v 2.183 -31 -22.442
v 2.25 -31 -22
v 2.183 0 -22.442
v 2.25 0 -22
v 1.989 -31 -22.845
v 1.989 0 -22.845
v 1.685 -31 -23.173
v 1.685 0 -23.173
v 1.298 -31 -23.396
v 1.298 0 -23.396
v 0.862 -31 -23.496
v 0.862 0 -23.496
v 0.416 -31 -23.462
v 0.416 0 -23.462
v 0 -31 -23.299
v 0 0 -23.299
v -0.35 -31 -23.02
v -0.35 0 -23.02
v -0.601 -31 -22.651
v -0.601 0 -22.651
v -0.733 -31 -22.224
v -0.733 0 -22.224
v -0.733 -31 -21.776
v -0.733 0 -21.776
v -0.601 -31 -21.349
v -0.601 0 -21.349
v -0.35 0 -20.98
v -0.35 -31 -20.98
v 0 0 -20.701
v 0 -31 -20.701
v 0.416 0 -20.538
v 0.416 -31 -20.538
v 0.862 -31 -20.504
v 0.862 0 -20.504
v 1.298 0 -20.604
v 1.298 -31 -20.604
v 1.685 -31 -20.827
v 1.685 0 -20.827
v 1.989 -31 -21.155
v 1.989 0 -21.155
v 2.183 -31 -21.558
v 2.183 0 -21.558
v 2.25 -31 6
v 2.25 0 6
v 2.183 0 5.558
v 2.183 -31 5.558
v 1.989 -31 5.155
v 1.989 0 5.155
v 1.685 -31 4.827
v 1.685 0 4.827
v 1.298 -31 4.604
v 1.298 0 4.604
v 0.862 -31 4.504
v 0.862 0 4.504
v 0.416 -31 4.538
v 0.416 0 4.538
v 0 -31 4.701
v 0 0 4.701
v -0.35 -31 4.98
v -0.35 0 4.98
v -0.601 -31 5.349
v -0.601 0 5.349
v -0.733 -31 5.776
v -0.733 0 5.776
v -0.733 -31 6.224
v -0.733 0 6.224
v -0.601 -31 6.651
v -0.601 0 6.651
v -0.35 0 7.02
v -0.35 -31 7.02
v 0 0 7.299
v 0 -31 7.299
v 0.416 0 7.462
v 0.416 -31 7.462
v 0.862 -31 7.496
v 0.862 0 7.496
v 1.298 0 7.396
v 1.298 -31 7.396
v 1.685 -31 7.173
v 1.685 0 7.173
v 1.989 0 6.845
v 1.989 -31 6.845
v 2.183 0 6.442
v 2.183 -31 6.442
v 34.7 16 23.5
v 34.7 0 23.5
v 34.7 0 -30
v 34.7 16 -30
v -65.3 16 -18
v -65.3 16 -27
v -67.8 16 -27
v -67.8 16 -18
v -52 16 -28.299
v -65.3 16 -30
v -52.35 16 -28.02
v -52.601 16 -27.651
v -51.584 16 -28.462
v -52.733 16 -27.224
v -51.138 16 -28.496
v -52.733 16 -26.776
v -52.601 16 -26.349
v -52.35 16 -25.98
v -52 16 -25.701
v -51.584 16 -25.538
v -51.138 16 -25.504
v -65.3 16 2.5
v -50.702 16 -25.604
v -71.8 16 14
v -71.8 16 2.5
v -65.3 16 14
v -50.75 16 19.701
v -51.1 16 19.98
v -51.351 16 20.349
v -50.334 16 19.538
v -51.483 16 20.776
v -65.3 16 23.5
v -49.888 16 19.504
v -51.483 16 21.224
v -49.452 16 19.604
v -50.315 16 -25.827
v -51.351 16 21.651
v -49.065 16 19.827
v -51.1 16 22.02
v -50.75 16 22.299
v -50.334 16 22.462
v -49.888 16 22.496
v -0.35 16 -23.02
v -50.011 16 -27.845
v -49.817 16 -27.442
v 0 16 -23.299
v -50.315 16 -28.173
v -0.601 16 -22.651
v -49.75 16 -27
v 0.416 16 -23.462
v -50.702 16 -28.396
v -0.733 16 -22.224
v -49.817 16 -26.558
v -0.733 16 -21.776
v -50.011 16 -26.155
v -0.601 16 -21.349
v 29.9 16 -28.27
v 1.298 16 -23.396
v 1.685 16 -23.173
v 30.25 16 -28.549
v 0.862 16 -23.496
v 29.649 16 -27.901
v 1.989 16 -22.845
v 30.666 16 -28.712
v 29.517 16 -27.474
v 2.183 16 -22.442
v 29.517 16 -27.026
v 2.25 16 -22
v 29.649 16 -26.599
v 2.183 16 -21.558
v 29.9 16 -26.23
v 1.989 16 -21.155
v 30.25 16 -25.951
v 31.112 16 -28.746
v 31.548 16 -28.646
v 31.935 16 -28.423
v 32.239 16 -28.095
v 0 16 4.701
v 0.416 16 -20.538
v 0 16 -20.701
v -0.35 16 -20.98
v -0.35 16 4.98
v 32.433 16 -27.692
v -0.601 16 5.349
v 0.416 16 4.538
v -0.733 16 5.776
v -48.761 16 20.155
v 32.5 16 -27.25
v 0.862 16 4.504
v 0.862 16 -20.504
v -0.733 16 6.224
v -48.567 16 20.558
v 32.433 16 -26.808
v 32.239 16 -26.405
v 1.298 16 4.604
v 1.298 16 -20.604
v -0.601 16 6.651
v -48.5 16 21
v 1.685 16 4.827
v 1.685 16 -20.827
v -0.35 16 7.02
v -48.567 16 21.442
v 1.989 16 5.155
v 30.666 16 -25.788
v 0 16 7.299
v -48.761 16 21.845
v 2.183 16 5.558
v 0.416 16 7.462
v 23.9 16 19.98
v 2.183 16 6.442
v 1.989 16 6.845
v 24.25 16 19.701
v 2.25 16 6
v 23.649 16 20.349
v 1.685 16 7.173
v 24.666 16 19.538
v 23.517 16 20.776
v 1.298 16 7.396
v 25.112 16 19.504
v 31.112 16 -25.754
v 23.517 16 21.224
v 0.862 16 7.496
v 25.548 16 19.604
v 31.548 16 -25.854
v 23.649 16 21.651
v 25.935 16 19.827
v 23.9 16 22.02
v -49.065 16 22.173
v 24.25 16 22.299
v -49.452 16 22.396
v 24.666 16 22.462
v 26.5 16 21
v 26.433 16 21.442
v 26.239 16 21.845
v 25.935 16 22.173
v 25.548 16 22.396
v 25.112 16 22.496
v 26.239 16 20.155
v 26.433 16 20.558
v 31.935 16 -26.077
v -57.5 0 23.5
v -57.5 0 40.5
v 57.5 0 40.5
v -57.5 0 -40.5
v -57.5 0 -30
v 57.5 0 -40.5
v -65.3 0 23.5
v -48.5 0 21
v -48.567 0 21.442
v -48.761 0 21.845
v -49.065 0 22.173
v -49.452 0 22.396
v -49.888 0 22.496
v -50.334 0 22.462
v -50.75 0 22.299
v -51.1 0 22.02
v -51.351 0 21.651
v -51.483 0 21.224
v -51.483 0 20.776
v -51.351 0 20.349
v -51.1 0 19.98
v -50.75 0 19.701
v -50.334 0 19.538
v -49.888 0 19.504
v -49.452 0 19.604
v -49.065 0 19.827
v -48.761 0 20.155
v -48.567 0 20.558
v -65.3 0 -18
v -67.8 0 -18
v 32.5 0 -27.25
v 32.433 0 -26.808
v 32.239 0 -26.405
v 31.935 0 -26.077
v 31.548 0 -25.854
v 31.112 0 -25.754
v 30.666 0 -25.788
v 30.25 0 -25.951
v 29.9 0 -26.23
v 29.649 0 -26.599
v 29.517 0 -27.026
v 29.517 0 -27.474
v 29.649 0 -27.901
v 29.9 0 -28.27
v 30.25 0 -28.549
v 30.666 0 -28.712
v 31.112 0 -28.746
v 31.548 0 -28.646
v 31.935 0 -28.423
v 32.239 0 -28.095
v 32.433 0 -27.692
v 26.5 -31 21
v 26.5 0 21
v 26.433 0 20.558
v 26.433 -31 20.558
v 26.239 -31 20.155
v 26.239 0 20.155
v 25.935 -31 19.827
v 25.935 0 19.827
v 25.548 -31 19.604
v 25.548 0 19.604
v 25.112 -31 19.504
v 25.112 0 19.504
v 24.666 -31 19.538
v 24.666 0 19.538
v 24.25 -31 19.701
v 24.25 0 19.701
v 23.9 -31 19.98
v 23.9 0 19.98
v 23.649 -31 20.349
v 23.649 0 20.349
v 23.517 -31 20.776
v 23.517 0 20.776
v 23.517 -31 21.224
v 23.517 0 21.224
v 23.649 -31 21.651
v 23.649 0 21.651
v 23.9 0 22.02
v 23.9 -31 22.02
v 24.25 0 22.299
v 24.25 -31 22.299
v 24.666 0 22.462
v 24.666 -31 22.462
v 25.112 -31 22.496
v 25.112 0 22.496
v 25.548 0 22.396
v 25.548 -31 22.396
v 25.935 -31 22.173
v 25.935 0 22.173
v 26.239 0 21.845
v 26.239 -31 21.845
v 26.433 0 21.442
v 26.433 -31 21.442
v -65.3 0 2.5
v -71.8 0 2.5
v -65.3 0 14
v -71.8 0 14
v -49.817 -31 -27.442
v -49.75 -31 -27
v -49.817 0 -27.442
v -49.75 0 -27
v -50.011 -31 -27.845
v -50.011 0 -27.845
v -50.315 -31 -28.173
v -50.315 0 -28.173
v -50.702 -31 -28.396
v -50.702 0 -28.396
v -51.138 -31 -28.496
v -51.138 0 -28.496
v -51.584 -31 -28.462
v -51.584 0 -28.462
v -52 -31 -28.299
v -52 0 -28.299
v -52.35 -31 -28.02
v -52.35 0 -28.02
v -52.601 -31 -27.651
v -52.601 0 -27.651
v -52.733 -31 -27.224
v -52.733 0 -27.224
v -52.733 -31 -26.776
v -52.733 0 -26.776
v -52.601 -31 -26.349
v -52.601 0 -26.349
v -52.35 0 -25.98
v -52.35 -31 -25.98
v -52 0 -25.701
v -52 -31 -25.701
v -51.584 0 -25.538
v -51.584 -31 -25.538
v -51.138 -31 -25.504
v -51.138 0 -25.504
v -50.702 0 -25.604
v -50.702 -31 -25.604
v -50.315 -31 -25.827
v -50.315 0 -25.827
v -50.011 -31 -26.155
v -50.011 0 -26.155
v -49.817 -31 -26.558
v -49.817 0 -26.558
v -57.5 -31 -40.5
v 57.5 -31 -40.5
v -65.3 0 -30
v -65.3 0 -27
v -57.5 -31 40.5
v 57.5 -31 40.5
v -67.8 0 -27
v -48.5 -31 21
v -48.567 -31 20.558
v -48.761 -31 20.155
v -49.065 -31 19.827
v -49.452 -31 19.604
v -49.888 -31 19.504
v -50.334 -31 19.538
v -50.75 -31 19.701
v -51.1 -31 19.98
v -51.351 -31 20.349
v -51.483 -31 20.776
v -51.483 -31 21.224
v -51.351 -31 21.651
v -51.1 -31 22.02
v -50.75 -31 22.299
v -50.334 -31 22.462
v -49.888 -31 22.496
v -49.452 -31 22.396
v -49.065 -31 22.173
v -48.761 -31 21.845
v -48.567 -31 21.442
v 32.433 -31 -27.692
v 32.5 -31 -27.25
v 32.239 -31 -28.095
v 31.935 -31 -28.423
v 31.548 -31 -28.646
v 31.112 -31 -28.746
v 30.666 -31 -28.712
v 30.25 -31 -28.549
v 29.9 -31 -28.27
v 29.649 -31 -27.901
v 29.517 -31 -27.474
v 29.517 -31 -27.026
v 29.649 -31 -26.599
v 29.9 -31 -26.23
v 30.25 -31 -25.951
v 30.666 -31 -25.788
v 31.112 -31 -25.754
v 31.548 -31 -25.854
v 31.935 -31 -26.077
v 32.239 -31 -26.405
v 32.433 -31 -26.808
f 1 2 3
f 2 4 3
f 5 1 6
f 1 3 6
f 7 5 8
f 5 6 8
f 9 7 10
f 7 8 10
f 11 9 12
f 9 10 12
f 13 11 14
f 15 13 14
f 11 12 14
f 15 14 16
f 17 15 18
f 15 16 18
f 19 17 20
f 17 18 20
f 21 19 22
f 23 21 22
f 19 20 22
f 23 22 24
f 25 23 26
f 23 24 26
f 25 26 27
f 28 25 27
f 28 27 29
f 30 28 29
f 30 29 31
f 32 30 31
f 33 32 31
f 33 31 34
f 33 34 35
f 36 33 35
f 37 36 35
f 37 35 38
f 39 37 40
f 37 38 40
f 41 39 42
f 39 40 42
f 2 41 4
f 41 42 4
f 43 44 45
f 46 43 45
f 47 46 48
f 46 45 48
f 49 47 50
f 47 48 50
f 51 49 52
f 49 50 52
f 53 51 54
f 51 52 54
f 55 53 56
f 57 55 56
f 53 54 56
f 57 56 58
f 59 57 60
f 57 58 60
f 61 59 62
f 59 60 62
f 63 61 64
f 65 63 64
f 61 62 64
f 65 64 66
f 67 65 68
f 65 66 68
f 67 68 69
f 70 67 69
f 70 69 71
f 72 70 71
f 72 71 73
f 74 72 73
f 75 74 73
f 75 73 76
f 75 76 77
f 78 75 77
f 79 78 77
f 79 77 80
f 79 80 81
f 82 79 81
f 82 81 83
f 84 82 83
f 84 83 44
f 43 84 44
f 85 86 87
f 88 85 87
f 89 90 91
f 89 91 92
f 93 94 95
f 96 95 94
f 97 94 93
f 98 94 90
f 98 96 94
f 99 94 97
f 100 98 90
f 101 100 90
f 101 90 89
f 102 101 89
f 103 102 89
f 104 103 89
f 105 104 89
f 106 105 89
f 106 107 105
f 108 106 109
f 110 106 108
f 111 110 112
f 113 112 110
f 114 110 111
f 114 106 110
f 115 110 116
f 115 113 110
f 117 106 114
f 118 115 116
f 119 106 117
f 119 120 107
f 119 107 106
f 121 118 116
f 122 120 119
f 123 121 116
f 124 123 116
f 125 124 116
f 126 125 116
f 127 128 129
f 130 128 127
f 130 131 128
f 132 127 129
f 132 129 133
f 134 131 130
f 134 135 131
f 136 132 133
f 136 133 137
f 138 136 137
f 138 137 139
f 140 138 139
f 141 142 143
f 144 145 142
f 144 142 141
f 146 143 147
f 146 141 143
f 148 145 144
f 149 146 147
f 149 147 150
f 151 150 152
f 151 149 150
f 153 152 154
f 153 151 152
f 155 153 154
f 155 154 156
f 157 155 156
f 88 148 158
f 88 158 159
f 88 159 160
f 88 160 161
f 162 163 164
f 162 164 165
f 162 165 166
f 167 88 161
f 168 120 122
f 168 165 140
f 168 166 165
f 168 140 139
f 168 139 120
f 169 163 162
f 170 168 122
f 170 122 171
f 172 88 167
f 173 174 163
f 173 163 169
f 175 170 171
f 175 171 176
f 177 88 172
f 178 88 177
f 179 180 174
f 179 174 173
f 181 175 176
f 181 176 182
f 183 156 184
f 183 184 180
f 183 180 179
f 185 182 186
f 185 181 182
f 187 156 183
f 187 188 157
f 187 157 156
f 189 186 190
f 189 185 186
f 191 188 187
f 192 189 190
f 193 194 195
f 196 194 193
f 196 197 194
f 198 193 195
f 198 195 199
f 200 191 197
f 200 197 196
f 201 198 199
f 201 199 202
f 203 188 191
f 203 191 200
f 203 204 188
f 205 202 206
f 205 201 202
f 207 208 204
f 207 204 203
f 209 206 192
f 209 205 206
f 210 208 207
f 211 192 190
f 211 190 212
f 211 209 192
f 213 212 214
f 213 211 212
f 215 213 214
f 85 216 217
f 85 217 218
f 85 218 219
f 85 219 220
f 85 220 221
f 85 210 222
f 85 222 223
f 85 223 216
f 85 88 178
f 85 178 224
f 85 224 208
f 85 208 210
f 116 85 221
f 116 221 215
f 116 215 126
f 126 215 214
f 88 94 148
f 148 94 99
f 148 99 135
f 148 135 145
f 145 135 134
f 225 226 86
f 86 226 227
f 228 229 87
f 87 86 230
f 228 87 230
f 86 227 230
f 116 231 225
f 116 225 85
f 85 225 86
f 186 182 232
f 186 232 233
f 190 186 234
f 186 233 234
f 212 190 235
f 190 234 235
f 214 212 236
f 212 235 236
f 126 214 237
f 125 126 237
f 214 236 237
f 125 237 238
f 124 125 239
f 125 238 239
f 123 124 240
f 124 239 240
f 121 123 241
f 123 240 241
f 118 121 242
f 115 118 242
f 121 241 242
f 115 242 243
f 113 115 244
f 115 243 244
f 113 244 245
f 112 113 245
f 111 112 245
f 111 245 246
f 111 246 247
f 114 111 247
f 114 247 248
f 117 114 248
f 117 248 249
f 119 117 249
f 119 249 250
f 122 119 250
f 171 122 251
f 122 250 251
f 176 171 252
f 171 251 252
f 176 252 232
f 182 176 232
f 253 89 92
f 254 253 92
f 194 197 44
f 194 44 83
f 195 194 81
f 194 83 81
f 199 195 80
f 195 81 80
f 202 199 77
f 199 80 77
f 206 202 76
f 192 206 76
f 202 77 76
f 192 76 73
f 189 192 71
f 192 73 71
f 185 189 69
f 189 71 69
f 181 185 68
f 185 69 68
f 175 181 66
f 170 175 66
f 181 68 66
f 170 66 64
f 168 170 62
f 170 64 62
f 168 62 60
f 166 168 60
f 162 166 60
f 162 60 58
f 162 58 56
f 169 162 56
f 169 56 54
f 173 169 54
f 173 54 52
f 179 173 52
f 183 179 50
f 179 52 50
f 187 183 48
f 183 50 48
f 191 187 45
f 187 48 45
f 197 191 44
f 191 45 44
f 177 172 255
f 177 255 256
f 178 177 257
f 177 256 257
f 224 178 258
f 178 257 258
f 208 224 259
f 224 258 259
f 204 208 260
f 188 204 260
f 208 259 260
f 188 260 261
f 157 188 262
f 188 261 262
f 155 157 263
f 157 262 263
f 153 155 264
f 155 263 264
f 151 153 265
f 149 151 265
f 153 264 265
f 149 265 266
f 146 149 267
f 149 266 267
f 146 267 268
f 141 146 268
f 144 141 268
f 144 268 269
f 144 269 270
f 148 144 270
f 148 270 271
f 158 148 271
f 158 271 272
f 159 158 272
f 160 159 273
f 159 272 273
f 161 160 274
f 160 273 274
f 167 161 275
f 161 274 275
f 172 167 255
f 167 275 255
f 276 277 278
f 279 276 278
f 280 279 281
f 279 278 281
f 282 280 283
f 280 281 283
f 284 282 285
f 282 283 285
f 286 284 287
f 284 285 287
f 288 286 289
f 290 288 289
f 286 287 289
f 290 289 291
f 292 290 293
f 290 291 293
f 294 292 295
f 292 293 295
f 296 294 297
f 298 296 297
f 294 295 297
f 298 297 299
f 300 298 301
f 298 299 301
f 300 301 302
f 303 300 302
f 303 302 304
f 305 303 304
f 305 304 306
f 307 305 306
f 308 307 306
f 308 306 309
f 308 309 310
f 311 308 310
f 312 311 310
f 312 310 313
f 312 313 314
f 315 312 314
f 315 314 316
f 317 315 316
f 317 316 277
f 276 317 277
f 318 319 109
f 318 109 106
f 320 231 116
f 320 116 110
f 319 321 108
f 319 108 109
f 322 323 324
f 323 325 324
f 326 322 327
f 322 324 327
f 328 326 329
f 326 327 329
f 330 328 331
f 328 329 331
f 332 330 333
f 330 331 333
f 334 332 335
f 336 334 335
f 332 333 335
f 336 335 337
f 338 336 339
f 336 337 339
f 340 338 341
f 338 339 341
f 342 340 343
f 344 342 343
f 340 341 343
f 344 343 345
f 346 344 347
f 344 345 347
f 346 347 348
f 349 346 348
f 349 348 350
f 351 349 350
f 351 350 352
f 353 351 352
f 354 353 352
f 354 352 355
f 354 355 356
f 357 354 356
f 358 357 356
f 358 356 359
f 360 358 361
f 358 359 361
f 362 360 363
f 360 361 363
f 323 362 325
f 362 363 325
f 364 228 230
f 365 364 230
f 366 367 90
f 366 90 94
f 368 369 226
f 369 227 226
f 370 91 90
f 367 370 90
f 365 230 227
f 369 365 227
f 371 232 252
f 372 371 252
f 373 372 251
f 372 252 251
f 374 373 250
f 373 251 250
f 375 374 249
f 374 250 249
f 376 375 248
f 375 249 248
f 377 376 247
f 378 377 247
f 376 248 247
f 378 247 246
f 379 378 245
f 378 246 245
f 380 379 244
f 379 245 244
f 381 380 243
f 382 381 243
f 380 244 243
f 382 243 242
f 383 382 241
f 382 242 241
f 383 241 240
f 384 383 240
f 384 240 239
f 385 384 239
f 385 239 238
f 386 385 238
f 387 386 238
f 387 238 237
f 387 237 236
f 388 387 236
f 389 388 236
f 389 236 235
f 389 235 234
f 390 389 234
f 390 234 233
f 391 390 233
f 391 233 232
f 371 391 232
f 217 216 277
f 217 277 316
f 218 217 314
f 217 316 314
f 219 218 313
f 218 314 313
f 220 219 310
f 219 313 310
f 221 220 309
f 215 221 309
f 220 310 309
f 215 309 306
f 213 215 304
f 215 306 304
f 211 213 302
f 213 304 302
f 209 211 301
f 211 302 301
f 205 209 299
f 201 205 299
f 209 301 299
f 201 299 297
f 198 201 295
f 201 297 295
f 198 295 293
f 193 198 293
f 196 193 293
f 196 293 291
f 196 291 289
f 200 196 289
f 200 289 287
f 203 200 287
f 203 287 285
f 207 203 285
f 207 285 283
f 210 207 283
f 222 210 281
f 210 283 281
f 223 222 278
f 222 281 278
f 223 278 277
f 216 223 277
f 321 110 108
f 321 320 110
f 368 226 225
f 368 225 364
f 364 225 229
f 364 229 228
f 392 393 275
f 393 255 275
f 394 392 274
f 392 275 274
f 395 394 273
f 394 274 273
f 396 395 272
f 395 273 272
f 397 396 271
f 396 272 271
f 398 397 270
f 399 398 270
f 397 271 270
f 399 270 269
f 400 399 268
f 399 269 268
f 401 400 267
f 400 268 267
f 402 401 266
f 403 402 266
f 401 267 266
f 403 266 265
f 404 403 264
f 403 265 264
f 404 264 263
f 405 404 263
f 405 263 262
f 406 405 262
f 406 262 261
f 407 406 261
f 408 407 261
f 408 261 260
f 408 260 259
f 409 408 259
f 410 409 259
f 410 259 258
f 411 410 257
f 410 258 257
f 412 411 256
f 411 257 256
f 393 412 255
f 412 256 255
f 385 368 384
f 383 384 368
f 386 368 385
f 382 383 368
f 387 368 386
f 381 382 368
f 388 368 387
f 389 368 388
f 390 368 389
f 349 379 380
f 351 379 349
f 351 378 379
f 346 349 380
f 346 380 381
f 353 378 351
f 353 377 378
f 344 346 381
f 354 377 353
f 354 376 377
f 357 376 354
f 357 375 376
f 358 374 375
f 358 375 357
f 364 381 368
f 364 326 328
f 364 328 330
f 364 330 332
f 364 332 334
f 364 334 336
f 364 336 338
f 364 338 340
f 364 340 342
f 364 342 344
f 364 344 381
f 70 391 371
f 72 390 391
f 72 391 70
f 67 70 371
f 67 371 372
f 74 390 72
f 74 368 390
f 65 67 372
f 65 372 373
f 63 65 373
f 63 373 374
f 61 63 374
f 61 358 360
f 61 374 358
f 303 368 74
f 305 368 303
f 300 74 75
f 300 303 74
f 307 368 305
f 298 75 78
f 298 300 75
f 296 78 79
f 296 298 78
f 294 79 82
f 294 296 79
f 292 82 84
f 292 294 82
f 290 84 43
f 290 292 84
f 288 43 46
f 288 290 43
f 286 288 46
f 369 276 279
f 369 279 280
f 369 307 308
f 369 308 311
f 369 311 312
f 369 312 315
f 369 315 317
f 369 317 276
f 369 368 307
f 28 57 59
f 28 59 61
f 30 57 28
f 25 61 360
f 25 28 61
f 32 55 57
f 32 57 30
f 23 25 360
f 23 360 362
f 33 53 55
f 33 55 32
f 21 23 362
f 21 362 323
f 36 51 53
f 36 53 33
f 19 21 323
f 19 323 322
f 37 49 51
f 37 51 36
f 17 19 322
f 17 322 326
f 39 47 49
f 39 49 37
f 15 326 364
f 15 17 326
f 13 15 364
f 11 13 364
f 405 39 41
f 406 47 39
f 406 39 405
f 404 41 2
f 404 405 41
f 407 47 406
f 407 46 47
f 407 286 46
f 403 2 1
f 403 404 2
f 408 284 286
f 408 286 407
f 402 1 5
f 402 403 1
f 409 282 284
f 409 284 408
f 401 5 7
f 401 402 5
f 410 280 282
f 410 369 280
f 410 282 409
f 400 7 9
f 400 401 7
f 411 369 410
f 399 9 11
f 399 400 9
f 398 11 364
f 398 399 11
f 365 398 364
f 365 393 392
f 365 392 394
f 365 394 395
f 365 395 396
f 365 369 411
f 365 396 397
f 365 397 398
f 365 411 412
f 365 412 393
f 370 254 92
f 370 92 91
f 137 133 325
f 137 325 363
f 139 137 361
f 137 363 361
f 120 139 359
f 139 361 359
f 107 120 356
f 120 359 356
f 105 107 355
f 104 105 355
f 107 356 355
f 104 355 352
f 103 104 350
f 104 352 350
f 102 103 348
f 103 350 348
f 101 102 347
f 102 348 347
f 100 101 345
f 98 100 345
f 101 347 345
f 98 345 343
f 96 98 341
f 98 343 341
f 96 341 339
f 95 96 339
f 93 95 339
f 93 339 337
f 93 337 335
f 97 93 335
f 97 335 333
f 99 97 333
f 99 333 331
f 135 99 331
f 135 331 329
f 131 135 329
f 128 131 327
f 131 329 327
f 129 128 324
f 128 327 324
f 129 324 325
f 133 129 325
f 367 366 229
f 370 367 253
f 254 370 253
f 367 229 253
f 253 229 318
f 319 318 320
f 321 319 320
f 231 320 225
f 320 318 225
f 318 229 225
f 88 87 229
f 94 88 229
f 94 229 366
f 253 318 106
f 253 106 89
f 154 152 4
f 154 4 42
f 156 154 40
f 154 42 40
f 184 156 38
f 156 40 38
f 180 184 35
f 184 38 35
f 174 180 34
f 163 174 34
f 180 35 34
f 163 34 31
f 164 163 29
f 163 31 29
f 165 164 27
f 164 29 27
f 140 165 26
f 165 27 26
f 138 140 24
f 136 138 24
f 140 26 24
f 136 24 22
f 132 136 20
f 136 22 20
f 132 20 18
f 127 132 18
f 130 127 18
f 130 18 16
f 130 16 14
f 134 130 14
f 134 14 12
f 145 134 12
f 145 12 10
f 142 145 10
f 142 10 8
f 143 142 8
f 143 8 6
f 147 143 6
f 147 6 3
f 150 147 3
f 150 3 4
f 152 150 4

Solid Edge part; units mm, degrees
sketch "Sketch1" plane through (0, 0, 0) normal (0, -1, 0) x (1, 0, 0)
  line L0 (57.5, -40.5) -> (57.5, 40.5)
  line L1 (57.5, 40.5) -> (-57.5, 40.5)
  line L2 (-57.5, 40.5) -> (-57.5, -40.5)
  line L3 (-57.5, -40.5) -> (57.5, -40.5)
extrude "Protrusion1" add sketch "Sketch1" along normal blind 31
sketch "Sketch2" plane through (0, 0, 0) normal (0, -1, 0) x (1, 0, 0)
  line L0 (-65.3, 23.5) -> (34.7, 23.5)
  line L1 (34.7, 23.5) -> (34.7, -30)
  line L2 (34.7, -30) -> (-65.3, -30)
  line L3 (-65.3, 23.5) -> (-65.3, -30)
extrude "Arduino" add sketch "Sketch2" against normal blind 16
sketch "Sketch3" plane through (0, 0, 0) normal (0, -1, 0) x (1, 0, 0)
  line L0 (-71.8, 14) -> (-71.8, 2.5)
  line L1 (-71.8, 2.5) -> (-57.5, 2.5)
  line L2 (-57.5, 2.5) -> (-57.5, 14)
  line L3 (-57.5, 14) -> (-65.3, 14)
  line L4 (-65.3, 14) -> (-71.8, 14)
  line L5 (-67.8, -18) -> (-67.8, -27)
  line L6 (-67.8, -27) -> (-57.5, -27)
  line L7 (-57.5, -27) -> (-57.5, -18)
  line L8 (-57.5, -18) -> (-64.65, -18)
  line L9 (-64.65, -18) -> (-67.8, -18)
extrude "Conectores" add sketch "Sketch3" against normal blind 16
sketch "Sketch4" plane through (0, 0, 0) normal (0, -1, 0) x (1, 0, 0)
  circle A0 centre (-50, 21) radius 1.5
  circle A1 centre (25, 21) radius 1.5
  circle A2 centre (31, -27.25) radius 1.5
  circle A3 centre (-51.25, -27) radius 1.5
  circle A4 centre (0.75, -22) radius 1.5
  circle A5 centre (0.75, 6) radius 1.5
extrude "Agujeros" cut sketch "Sketch4" along normal mid plane 70.2775
